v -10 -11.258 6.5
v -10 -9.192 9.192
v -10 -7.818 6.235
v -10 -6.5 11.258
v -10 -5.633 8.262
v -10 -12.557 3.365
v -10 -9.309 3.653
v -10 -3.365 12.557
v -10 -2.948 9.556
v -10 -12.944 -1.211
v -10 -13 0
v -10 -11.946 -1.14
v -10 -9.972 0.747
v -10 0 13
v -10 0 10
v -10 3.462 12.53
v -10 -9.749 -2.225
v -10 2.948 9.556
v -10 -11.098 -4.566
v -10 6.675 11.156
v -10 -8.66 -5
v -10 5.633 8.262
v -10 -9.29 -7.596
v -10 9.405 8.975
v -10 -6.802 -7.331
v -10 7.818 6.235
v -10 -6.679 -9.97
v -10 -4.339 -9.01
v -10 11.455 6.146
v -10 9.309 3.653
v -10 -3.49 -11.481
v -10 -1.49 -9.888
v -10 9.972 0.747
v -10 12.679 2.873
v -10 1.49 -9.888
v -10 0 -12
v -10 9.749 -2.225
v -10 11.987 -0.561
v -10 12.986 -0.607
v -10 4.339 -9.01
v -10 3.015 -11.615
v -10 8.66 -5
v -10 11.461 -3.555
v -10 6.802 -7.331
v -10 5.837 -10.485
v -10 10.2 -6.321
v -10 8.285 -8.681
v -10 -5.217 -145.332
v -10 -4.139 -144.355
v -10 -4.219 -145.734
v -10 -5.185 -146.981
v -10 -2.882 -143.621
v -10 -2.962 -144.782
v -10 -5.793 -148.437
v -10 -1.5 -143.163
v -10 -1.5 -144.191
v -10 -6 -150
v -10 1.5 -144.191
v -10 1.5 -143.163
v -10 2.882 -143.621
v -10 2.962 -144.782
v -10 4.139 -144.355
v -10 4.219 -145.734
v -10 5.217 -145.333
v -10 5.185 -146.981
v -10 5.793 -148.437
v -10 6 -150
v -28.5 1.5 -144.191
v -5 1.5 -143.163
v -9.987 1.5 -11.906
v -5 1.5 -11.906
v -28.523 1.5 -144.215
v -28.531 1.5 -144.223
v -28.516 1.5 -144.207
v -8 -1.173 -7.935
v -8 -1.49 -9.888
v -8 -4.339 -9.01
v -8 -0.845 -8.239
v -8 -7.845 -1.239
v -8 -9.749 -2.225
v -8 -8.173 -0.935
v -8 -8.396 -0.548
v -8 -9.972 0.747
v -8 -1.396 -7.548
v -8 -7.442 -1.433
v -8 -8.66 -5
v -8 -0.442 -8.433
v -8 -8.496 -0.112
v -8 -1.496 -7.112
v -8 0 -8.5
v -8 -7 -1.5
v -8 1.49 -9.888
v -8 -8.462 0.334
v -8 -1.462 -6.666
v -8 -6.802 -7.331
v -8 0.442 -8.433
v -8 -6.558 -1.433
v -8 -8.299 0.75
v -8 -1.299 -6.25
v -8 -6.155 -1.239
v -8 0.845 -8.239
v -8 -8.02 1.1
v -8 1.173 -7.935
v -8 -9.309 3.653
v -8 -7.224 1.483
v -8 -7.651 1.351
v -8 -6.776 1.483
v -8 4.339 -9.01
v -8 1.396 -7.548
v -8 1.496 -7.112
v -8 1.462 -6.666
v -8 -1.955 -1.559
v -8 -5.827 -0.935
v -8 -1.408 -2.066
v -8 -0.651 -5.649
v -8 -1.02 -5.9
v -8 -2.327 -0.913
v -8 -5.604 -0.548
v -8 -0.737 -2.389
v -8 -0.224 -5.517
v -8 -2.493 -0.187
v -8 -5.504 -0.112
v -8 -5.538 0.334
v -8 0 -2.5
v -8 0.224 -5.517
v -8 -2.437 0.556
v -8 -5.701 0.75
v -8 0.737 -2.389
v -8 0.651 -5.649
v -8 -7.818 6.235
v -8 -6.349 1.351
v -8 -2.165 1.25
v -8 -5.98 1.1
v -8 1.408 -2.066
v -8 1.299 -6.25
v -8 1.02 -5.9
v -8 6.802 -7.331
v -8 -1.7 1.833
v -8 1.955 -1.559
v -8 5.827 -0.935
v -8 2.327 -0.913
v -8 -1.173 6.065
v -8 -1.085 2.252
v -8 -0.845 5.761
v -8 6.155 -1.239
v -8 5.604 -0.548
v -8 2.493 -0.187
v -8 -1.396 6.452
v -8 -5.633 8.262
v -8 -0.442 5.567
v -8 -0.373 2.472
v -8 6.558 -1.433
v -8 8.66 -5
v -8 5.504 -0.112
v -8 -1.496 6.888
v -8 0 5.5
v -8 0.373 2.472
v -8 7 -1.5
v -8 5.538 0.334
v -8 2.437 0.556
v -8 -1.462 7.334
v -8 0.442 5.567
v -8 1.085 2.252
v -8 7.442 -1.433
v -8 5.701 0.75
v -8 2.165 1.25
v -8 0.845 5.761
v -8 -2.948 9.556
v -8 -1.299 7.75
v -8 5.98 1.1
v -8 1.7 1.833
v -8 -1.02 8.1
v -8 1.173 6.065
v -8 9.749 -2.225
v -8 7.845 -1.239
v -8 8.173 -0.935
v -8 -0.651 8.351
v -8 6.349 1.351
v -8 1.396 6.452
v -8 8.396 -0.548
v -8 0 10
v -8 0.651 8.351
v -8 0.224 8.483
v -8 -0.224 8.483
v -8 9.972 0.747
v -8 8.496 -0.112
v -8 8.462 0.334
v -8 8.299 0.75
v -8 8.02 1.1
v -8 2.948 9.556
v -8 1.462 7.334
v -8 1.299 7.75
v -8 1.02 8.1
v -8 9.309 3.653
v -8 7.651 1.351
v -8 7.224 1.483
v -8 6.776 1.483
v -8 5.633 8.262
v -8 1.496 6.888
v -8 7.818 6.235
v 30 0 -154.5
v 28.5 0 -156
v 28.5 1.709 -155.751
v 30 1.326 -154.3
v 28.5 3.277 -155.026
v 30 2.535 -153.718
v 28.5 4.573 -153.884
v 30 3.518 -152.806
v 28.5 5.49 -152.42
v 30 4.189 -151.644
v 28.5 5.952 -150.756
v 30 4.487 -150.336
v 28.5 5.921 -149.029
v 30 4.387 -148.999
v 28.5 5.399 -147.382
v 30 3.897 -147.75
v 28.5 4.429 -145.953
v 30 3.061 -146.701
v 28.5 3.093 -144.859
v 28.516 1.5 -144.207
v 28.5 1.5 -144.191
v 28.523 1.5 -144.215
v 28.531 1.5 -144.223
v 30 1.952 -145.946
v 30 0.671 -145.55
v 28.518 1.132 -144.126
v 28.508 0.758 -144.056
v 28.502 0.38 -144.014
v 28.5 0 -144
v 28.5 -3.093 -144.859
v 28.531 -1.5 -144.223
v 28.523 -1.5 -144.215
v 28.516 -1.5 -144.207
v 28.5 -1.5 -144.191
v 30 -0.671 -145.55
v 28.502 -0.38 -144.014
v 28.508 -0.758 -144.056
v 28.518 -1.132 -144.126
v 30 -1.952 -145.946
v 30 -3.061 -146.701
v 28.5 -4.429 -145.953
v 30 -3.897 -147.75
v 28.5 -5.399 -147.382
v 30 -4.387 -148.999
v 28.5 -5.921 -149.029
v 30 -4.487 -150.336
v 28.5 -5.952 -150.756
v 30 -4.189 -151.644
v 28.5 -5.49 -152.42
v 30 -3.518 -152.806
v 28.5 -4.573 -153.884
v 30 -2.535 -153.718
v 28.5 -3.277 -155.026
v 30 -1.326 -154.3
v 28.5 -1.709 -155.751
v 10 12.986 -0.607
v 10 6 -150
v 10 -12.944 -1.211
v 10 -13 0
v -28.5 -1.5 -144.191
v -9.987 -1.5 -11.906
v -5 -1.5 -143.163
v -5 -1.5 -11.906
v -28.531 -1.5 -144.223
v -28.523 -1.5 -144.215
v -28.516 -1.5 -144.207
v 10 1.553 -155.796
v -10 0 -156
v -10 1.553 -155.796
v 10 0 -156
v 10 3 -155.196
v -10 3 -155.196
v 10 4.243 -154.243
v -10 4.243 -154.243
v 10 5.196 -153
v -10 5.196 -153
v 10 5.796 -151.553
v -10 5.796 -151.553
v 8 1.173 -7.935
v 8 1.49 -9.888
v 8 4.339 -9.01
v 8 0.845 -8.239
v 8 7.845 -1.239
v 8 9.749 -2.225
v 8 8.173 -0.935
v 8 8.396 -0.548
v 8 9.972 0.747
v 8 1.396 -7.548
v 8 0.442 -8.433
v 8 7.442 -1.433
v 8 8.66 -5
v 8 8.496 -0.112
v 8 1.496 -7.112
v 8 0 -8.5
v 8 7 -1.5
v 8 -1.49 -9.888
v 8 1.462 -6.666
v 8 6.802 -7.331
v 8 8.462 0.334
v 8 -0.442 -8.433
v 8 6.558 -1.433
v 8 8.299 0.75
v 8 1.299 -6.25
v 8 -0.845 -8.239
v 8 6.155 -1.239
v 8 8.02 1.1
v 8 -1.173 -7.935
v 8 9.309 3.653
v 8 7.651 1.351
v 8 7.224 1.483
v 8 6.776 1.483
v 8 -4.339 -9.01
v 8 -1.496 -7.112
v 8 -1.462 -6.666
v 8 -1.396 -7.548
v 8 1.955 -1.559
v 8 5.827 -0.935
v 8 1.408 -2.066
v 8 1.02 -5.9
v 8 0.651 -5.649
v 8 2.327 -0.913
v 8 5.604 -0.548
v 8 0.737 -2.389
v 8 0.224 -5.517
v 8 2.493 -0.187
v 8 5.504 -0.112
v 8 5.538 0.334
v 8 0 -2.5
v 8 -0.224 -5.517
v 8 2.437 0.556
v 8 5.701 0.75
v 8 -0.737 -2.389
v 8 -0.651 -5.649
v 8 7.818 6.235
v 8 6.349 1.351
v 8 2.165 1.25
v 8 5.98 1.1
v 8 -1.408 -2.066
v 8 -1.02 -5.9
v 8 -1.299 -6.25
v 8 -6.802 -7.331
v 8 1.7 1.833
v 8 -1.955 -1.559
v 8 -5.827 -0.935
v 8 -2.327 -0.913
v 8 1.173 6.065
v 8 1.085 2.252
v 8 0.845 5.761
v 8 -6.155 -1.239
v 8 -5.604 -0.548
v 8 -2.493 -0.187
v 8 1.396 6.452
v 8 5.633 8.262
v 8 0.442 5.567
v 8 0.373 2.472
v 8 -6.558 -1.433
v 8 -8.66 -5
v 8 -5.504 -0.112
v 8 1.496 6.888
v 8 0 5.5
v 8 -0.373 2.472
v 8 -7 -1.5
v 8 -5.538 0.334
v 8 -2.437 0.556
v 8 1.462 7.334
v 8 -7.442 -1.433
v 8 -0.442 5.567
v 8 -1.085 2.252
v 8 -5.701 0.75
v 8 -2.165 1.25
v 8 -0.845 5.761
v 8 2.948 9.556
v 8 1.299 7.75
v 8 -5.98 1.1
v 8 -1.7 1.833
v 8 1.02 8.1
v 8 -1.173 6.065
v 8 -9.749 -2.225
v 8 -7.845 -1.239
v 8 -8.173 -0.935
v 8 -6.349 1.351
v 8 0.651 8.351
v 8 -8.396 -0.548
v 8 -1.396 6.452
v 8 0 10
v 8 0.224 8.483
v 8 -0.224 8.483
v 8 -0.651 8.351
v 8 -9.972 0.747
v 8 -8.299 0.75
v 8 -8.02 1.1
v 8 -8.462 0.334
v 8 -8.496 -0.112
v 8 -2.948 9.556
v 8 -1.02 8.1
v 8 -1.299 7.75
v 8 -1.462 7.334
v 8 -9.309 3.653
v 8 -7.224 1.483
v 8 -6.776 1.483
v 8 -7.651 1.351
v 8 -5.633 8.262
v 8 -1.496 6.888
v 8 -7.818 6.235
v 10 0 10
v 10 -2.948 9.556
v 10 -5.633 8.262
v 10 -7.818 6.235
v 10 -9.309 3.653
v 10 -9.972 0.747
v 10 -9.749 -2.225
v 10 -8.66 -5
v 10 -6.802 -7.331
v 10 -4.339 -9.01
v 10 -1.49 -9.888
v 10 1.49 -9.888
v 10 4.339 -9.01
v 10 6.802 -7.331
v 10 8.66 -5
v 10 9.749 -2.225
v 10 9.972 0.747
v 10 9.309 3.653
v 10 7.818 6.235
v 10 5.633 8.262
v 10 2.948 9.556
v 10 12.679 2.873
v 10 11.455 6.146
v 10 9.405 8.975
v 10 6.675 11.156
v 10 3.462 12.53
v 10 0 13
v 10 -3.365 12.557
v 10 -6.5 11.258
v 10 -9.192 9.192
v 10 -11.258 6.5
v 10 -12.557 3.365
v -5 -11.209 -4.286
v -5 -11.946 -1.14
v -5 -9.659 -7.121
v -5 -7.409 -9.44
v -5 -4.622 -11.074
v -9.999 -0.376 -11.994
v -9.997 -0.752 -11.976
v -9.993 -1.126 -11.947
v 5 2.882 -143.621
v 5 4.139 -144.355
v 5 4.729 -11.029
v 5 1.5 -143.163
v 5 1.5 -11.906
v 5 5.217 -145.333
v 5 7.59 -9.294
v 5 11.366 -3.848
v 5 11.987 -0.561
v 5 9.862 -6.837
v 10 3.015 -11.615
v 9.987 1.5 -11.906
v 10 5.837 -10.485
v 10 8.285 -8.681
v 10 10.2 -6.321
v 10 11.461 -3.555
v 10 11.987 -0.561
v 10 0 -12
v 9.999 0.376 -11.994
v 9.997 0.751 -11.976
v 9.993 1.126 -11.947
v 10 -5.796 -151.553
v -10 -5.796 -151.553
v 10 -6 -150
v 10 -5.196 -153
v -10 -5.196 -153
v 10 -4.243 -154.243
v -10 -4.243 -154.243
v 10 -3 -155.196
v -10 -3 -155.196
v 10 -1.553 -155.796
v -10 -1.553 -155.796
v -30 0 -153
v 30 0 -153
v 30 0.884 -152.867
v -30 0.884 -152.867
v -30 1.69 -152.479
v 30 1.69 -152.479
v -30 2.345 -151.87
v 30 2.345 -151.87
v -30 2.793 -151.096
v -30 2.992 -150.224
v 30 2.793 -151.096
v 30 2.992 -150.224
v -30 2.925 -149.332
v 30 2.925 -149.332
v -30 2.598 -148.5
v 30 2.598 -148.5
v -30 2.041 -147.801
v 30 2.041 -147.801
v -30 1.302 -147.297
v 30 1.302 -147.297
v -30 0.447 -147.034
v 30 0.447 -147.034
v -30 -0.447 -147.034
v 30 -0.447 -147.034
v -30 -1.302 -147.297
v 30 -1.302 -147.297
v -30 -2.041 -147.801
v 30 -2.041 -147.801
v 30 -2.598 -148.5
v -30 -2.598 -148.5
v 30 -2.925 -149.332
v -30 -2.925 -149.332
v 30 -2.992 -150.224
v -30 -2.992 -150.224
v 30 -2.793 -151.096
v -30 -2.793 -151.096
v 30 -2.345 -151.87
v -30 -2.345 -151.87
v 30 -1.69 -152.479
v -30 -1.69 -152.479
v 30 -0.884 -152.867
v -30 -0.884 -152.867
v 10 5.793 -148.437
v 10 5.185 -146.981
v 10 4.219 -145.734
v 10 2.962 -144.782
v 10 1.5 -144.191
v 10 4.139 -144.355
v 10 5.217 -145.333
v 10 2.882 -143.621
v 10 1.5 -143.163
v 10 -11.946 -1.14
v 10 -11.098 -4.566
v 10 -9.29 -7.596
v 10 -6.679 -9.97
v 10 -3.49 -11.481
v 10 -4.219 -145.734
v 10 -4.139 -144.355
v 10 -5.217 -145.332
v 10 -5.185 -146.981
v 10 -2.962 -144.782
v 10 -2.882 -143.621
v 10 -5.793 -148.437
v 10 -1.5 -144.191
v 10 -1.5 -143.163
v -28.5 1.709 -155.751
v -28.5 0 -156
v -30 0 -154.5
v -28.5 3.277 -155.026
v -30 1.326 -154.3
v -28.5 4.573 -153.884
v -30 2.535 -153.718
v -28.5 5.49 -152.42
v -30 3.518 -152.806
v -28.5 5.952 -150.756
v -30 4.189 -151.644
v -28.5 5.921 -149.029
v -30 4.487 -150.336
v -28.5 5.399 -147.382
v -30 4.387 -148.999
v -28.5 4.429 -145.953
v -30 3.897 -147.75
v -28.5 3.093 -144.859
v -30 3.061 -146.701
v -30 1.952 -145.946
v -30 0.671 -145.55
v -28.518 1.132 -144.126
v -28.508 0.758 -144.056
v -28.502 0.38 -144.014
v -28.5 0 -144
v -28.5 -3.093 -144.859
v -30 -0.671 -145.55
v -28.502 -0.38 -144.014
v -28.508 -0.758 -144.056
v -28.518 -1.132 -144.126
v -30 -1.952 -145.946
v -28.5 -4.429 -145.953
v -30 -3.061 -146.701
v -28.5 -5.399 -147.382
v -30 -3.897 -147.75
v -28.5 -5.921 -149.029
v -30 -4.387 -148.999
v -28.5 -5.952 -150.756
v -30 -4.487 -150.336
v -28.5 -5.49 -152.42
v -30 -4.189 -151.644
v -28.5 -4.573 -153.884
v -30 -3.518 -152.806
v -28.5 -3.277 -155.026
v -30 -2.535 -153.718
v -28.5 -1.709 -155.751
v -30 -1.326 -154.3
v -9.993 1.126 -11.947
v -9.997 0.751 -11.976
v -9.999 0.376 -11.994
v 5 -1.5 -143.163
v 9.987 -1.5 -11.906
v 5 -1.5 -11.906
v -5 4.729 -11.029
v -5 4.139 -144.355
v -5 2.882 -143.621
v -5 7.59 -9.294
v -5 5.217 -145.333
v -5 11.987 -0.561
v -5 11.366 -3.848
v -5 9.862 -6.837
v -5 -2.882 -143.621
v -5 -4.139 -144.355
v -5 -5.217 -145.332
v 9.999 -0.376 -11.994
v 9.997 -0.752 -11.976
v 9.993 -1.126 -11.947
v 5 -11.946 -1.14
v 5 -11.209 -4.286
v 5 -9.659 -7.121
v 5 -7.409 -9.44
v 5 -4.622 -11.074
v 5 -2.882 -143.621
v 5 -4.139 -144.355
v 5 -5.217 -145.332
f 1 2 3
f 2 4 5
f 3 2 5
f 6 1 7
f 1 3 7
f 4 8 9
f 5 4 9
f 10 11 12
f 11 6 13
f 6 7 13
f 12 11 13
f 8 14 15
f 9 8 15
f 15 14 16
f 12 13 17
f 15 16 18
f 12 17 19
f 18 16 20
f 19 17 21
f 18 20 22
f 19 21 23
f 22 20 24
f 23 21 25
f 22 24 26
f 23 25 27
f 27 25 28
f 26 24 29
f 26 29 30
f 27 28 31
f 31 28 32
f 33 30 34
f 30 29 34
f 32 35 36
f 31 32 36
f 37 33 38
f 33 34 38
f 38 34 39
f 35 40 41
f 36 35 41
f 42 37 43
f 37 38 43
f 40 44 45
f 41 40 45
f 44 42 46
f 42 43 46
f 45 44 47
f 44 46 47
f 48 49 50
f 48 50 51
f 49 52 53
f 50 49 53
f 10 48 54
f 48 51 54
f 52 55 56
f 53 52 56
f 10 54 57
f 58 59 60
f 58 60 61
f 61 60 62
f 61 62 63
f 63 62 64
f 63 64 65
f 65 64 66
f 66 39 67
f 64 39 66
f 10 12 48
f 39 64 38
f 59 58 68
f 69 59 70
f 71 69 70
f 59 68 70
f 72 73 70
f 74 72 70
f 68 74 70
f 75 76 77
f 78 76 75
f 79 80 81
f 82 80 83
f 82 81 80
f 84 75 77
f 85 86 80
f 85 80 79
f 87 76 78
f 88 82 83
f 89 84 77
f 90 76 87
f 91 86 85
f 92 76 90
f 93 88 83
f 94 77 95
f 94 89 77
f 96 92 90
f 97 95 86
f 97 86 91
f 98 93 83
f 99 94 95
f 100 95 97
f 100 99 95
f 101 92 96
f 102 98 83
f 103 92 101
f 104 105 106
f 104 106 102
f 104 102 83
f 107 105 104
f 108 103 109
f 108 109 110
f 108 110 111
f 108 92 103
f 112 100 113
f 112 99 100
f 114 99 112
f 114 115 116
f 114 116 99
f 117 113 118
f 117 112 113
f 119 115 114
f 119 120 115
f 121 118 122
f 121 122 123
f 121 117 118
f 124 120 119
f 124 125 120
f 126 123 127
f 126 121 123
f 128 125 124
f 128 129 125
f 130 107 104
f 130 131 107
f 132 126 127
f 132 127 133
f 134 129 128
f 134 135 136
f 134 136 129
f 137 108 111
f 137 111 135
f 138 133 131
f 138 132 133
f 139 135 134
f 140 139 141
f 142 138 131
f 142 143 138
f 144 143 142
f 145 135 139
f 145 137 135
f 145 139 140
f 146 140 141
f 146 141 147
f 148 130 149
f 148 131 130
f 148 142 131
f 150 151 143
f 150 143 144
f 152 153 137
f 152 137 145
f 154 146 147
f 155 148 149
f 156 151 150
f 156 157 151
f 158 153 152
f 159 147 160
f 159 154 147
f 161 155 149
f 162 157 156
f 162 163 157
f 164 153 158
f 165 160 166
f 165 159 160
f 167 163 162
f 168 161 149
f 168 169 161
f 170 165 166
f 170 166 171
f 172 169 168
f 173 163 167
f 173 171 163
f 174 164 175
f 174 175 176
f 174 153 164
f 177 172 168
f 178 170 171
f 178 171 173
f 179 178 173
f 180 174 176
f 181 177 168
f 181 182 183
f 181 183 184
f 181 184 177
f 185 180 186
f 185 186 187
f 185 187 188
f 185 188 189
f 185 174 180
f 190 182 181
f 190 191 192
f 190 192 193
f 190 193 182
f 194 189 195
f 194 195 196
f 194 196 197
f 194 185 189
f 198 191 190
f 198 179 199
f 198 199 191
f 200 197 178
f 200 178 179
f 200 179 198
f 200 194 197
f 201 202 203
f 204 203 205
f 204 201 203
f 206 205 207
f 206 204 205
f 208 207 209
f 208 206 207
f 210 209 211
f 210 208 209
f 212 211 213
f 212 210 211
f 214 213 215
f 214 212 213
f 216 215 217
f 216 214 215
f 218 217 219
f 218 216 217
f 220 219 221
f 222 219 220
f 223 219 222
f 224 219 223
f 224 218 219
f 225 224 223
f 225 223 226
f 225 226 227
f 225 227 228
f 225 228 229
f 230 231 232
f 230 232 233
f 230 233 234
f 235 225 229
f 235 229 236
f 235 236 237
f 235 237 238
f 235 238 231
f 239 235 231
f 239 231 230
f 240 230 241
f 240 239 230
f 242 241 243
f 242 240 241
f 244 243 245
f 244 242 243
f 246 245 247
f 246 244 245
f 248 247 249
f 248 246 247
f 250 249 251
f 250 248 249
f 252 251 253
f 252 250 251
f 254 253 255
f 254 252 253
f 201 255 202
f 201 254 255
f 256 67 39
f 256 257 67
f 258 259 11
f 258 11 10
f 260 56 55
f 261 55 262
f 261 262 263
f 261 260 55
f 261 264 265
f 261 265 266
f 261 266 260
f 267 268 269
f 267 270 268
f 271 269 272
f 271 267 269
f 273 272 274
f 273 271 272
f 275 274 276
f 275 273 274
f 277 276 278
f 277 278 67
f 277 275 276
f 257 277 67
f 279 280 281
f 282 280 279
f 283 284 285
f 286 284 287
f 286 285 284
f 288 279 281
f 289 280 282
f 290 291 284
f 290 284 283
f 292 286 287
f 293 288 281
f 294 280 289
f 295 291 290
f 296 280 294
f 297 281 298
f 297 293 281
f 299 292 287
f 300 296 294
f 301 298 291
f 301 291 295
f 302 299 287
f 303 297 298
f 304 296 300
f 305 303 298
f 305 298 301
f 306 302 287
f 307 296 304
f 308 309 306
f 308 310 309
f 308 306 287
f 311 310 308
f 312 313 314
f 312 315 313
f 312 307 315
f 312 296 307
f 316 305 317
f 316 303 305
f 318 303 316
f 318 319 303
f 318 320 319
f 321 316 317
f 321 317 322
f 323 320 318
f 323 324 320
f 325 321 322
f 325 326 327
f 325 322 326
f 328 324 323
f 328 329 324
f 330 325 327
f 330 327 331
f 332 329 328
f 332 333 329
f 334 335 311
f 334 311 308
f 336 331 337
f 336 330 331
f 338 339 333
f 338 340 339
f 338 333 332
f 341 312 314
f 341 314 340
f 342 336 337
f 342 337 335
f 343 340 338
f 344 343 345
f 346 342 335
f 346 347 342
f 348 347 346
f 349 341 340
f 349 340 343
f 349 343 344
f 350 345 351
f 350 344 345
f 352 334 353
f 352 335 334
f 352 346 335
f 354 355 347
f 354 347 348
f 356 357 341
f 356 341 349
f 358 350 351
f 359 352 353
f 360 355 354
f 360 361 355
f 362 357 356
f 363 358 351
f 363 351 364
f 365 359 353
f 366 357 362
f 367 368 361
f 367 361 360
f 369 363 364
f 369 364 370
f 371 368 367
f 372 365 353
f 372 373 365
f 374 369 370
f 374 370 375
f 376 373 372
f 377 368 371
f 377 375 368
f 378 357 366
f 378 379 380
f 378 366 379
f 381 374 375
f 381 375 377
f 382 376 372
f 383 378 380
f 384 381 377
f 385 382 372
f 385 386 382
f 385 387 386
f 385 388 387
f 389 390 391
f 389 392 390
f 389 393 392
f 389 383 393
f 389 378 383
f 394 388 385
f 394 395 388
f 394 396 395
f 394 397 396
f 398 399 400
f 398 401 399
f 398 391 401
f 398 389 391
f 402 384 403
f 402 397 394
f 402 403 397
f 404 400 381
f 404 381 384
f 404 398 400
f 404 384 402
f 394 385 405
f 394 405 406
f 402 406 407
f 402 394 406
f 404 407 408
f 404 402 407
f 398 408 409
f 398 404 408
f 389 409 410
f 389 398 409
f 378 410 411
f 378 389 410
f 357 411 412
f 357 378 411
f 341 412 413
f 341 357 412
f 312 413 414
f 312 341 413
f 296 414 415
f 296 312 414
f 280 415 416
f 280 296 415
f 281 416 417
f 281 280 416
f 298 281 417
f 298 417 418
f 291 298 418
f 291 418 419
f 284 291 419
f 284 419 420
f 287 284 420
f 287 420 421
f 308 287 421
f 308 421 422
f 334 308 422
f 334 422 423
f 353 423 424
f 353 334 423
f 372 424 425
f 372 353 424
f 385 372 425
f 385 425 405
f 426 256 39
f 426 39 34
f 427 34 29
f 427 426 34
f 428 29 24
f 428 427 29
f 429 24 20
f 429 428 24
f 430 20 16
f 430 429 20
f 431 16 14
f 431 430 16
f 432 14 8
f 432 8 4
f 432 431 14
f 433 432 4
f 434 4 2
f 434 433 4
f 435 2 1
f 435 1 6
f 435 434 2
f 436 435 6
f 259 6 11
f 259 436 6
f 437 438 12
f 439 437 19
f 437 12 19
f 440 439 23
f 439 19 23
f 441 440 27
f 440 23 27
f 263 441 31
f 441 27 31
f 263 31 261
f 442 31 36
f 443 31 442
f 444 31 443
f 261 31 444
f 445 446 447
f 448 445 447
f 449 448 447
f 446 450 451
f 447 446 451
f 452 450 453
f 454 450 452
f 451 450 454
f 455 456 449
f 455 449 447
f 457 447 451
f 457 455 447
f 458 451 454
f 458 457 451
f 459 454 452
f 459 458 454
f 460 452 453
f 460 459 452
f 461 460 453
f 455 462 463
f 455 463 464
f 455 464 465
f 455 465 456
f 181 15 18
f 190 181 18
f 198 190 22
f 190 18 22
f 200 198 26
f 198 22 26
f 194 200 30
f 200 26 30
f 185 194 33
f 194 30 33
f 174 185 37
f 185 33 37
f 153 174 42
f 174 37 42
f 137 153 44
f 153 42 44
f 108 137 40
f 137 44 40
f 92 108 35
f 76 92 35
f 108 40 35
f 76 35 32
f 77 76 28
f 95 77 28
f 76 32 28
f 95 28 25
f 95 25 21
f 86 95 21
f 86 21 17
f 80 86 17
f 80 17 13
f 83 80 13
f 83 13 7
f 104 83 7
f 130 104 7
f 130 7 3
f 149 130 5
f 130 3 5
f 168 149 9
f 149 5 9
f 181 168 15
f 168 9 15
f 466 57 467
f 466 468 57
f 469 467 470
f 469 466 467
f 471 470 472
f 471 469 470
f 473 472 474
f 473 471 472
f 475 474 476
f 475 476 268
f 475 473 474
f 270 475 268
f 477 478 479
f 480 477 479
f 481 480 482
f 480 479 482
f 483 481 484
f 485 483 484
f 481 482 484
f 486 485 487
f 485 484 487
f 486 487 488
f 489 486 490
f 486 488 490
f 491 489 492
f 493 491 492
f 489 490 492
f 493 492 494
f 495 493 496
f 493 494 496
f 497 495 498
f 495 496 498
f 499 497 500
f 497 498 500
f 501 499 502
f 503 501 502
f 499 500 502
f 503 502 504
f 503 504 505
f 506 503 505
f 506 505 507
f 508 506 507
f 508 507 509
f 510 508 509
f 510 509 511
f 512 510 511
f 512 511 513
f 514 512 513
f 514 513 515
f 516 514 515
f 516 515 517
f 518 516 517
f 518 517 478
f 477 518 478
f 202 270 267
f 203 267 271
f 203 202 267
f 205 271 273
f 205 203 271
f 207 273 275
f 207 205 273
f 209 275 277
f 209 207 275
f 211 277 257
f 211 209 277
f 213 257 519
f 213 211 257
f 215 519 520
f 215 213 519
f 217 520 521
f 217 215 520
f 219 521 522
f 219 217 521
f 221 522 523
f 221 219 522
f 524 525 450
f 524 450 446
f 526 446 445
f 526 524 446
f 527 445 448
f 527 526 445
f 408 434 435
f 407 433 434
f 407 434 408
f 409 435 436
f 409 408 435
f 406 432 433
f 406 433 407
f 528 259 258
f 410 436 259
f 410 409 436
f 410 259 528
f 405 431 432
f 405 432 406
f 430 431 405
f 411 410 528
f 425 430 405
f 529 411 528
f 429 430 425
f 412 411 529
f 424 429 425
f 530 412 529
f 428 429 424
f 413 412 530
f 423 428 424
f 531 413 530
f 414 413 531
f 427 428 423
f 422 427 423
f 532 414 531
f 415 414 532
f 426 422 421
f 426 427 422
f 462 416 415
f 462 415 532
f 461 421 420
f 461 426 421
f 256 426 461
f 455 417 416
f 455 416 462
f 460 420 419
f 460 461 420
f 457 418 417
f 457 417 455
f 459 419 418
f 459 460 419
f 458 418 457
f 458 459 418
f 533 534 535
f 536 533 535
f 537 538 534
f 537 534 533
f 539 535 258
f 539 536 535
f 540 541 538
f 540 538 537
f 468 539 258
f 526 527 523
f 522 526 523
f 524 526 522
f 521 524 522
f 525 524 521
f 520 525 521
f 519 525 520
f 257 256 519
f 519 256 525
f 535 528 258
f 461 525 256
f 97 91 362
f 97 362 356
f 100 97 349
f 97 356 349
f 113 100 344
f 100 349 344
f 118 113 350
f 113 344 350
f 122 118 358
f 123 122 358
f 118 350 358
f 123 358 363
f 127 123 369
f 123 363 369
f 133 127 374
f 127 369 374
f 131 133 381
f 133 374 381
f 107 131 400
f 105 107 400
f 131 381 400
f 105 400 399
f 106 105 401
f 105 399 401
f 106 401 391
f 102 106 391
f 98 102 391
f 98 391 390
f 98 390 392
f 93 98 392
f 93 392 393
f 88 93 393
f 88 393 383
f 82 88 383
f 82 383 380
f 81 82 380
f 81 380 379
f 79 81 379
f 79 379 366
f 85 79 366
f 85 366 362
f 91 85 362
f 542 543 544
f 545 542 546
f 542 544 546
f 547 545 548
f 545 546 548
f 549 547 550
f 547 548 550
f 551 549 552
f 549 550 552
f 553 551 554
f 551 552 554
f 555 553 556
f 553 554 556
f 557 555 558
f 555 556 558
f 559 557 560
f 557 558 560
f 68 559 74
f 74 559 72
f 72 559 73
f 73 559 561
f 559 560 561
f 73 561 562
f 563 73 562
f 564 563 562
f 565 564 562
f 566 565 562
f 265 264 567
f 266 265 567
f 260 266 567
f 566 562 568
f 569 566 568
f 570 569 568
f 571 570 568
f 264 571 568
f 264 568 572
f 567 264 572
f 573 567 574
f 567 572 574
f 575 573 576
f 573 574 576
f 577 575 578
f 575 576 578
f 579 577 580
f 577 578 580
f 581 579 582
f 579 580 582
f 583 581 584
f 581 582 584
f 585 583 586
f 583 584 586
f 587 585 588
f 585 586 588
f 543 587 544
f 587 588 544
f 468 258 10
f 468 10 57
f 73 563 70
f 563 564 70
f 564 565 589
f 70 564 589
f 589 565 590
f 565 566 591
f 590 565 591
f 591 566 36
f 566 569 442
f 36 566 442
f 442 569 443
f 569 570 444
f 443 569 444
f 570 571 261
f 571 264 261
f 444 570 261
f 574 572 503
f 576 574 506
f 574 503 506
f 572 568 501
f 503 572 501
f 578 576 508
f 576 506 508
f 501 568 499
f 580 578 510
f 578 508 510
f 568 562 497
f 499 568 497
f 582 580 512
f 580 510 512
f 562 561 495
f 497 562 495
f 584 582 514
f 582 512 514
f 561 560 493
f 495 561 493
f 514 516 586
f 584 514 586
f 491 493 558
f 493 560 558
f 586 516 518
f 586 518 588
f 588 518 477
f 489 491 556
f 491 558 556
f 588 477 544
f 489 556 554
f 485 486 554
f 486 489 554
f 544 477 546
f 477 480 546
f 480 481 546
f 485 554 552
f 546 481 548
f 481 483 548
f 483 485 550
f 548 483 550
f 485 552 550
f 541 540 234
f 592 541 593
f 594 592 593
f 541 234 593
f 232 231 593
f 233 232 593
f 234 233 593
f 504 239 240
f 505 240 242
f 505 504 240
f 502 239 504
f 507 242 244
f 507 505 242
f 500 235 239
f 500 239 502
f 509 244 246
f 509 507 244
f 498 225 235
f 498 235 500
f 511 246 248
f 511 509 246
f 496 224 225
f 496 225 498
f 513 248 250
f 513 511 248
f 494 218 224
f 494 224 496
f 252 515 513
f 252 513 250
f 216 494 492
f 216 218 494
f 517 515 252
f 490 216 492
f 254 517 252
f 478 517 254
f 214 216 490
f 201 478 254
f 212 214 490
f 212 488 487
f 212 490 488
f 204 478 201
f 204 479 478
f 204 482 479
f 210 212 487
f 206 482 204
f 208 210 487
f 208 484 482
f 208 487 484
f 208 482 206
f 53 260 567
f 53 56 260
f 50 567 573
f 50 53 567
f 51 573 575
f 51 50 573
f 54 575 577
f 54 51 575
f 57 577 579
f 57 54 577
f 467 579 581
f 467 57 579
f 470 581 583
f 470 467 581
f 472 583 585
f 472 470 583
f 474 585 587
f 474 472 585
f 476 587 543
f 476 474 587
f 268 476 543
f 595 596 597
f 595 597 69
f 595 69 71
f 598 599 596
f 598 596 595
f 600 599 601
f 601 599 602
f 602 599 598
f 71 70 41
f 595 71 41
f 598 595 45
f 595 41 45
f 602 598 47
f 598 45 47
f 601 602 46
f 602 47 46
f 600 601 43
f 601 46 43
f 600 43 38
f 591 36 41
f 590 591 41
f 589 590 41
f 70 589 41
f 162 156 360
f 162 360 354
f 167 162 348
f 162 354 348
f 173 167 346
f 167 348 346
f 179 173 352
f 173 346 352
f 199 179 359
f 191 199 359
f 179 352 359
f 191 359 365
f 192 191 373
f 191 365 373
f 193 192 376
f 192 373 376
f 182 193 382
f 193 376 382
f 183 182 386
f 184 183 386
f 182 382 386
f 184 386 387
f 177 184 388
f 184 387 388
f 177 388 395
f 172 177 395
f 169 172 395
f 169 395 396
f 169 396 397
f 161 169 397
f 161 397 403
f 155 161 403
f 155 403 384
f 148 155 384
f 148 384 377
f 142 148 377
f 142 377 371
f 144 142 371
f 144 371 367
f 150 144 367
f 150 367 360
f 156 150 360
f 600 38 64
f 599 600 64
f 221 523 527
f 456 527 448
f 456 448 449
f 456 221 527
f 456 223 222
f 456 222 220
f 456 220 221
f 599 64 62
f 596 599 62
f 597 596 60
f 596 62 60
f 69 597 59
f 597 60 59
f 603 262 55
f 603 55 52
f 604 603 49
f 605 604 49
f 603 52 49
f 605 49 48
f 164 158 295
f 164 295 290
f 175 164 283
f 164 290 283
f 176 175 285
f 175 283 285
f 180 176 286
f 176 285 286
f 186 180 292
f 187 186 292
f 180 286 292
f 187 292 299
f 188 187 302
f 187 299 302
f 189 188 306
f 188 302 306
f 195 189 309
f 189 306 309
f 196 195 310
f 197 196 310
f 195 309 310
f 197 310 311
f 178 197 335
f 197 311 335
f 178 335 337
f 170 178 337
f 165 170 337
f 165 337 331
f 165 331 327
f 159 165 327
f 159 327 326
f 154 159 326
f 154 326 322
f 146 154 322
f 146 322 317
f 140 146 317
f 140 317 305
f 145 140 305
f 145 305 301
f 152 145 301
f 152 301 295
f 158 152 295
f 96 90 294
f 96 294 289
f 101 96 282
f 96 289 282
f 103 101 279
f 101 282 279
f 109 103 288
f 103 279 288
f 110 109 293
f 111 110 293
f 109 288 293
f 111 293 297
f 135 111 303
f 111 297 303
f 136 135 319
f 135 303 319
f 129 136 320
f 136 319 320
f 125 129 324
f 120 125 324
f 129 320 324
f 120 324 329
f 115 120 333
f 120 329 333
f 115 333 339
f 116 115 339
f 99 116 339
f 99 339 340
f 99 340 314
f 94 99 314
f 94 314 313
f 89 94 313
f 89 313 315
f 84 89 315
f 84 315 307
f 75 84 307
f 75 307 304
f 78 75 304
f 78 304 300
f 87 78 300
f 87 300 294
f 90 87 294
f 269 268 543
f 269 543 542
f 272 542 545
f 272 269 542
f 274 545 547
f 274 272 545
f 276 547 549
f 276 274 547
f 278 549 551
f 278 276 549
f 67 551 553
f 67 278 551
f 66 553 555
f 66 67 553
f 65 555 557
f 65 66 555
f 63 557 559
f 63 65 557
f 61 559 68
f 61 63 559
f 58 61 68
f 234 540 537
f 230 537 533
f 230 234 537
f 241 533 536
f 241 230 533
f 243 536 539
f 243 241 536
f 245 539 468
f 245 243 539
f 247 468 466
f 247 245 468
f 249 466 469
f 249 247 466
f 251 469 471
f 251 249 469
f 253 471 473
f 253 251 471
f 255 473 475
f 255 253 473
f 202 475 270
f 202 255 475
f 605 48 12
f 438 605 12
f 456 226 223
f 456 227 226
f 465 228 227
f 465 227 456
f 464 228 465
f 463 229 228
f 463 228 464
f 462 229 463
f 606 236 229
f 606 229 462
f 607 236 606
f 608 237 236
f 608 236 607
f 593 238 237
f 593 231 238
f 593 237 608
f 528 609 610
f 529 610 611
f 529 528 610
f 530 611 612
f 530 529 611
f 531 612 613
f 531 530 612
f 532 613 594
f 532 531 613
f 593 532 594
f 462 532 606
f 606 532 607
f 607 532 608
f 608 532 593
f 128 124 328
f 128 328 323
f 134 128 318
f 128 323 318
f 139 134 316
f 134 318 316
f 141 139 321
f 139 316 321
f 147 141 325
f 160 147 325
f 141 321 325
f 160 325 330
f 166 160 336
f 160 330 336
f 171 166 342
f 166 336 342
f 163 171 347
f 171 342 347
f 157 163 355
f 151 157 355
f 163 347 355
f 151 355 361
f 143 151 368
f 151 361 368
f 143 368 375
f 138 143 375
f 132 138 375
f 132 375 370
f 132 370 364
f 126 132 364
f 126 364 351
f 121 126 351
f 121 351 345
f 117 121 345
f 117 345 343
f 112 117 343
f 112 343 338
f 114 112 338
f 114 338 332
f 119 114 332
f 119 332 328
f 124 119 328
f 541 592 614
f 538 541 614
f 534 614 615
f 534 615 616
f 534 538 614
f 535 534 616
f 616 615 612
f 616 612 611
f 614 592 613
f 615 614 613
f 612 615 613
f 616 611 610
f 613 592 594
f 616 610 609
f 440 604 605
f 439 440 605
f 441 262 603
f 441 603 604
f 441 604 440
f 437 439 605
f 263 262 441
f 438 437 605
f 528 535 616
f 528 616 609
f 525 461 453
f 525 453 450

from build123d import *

# Parameters (mm, degrees)
EXTRUDE_1_DEPTH     = 10
SKETCH_2_R          = 10
CUT_EXTRUDE_1_DEPTH = 2
CUT_EXTRUDE_START   = -2
SKETCH_4_R          = 10
CUT_EXTRUDE_2_DEPTH = 2
SKETCH_5_R          = 1.5
SKETCH_5_R_2        = 2.5
CUT_EXTRUDE_3_DEPTH = 158.572205671
SKETCH_7_R          = 6
EXTRUDE_3_DEPTH     = 30
SKETCH_8_R          = 3
CUT_EXTRUDE_4_DEPTH = 168.645459229
CHAMFER_1_SIZE      = 1.5
CUT_EXTRUDE_5_DEPTH = 5
RIB_1_REACH         = 161.389
SKETCH_10_WALL_W    = 454.069017414
SKETCH_10_WALL_H    = 3


with BuildPart() as part:
    # 草图1 → 凸台-拉伸1 (new, symmetric)
    with BuildSketch(Plane(origin=(0, 0, 0), x_dir=(0, 0, -1), z_dir=(1, 0, 0))):
        with BuildLine():
            Line((13, 0), (-13, 0))
            ThreePointArc((-13, 0), (-9.192388155, -9.192388155), (0, -13))
            Line((0, -13), (1.210696705, -12.94350082))
            ThreePointArc((1.210696705, -12.94350082), (9.610906751, -8.753883219), (13, 0))
        make_face()
        with BuildLine():
            ThreePointArc((0.607234259, 12.9858102), (-8.975131047, 9.404627727), (-13, 0))
            Line((-13, 0), (13, 0))
            ThreePointArc((13, 0), (9.404627727, 8.975131047), (0.607234259, 12.9858102))
        make_face()
        with BuildLine():
            ThreePointArc((0.607234259, 12.9858102), (9.404627727, 8.975131047), (13, 0))
            Line((13, 0), (144, 0))
            ThreePointArc((144, 0), (145.757359313, 4.242640687), (150, 6))
            Line((150, 6), (0.607234259, 12.9858102))
        make_face()
        with BuildLine():
            Line((144, 0), (13, 0))
            ThreePointArc((13, 0), (9.610906751, -8.753883219), (1.210696705, -12.94350082))
            Line((1.210696705, -12.94350082), (150, -6))
            ThreePointArc((150, -6), (145.757359313, -4.242640687), (144, 0))
        make_face()
        with BuildLine():
            ThreePointArc((150, 6), (145.757359313, 4.242640687), (144, 0))
            Line((144, 0), (156, 0))
            ThreePointArc((156, 0), (154.242640687, 4.242640687), (150, 6))
        make_face()
        with BuildLine():
            Line((156, 0), (144, 0))
            ThreePointArc((144, 0), (145.757359313, -4.242640687), (150, -6))
            ThreePointArc((150, -6), (154.242640687, -4.242640687), (156, 0))
        make_face()
        with BuildLine():
            ThreePointArc((150, 6), (145.757359313, 4.242640687), (144, 0))
            Line((144, 0), (156, 0))
            ThreePointArc((156, 0), (154.242640687, 4.242640687), (150, 6))
        make_face()
        with BuildLine():
            Line((156, 0), (144, 0))
            ThreePointArc((144, 0), (145.757359313, -4.242640687), (150, -6))
            ThreePointArc((150, -6), (154.242640687, -4.242640687), (156, 0))
        make_face()
    extrude(amount=EXTRUDE_1_DEPTH, both=True)

    # 草图2 → 切除-拉伸1 (cut)
    with BuildSketch(Plane.ZY.offset(10)):
        Circle(SKETCH_2_R)
    extrude(amount=-CUT_EXTRUDE_1_DEPTH, mode=Mode.SUBTRACT)

    # 草图4 → 切除-拉伸2 (cut)
    with BuildSketch(Plane(origin=(10, 0, 0), x_dir=(0, 0, -1), z_dir=(1, 0, 0)).offset(CUT_EXTRUDE_START)):
        with Locations(Location((0, 0, 0), (0, 0, 180))):
            Circle(SKETCH_4_R)
    extrude(amount=CUT_EXTRUDE_2_DEPTH, mode=Mode.SUBTRACT)

    # 草图5 → 切除-拉伸3 (cut, through all)
    with BuildSketch(Plane(origin=(8, 0, 0), x_dir=(0, 0, -1), z_dir=(1, 0, 0))):
        with Locations((7, 0)):
            Circle(SKETCH_5_R)
        with Locations((0, 7)):
            Circle(SKETCH_5_R)
        with Locations((-7, 0)):
            Circle(SKETCH_5_R)
        with Locations((0, -7)):
            Circle(SKETCH_5_R)
        Circle(SKETCH_5_R_2)
    extrude(amount=-CUT_EXTRUDE_3_DEPTH, mode=Mode.SUBTRACT)

    # 草图7 → 凸台-拉伸3 (add, symmetric)
    with BuildSketch(Plane(origin=(0, 0, 0), x_dir=(0, 0, -1), z_dir=(1, 0, 0))):
        with Locations((150, 0)):
            Circle(SKETCH_7_R)
    extrude(amount=EXTRUDE_3_DEPTH, both=True)

    # 草图8 → 切除-拉伸4 (cut, through all)
    with BuildSketch(Plane(origin=(30, 0, 0), x_dir=(0, 0, -1), z_dir=(1, 0, 0))):
        with Locations((150, 0)):
            Circle(SKETCH_8_R)
    extrude(amount=-CUT_EXTRUDE_4_DEPTH, mode=Mode.SUBTRACT)

    # 倒角1
    chamfer_1_edges = [part.edges().sort_by_distance(p)[0] for p in [
        (-30, 0, -144),
        (30, 0, -144),
    ]]
    chamfer(chamfer_1_edges, length=CHAMFER_1_SIZE)

    # 草图9 → 切除-拉伸5 (cut)
    with BuildSketch(Plane.ZY.offset(10)):
        with BuildLine():
            Line((-145.332480771, -5.216729267), (-1.140319123, -11.945696811))
            ThreePointArc((-1.140319123, -11.945696811), (-11.996480106, 0.290628762), (-0.560523931, 11.986901723))
            Line((-0.560523931, 11.986901723), (-145.332945614, 5.217145135))
            ThreePointArc((-145.332945614, 5.217145135), (-143.000000007, 0.000311859), (-145.332480771, -5.216729267))
        make_face()
    cut_extrude_5 = extrude(amount=-CUT_EXTRUDE_5_DEPTH, mode=Mode.SUBTRACT)

    # 镜向1: 切除-拉伸5 across plane
    add(cut_extrude_5.mirror(Plane(origin=(0, 0, 0), x_dir=(0, 0, 1), z_dir=(1, 0, 0))), mode=Mode.SUBTRACT)

    # 草图10 wall → 筋1 (add, up to next)
    with BuildSketch(Plane(origin=(-19.25, 0, -78), x_dir=(0.138795007241, 0, 0.990321132747), z_dir=(0.990321132747, 0, -0.138795007241)), mode=Mode.PRIVATE) as rib_1_sk1:
        Rectangle(SKETCH_10_WALL_W, SKETCH_10_WALL_H)
    rib_1_tool1 = extrude(rib_1_sk1.sketch, amount=RIB_1_REACH, mode=Mode.PRIVATE) - part.part
    rib_1 = rib_1_tool1.solids().sort_by_distance((-19.25, 0, -78))[0]
    add(rib_1)

    # 镜向2: 筋1 across plane
    add(rib_1.mirror(Plane(origin=(0, 0, 0), x_dir=(0, 0, 1), z_dir=(1, 0, 0))))


solid = part.part
